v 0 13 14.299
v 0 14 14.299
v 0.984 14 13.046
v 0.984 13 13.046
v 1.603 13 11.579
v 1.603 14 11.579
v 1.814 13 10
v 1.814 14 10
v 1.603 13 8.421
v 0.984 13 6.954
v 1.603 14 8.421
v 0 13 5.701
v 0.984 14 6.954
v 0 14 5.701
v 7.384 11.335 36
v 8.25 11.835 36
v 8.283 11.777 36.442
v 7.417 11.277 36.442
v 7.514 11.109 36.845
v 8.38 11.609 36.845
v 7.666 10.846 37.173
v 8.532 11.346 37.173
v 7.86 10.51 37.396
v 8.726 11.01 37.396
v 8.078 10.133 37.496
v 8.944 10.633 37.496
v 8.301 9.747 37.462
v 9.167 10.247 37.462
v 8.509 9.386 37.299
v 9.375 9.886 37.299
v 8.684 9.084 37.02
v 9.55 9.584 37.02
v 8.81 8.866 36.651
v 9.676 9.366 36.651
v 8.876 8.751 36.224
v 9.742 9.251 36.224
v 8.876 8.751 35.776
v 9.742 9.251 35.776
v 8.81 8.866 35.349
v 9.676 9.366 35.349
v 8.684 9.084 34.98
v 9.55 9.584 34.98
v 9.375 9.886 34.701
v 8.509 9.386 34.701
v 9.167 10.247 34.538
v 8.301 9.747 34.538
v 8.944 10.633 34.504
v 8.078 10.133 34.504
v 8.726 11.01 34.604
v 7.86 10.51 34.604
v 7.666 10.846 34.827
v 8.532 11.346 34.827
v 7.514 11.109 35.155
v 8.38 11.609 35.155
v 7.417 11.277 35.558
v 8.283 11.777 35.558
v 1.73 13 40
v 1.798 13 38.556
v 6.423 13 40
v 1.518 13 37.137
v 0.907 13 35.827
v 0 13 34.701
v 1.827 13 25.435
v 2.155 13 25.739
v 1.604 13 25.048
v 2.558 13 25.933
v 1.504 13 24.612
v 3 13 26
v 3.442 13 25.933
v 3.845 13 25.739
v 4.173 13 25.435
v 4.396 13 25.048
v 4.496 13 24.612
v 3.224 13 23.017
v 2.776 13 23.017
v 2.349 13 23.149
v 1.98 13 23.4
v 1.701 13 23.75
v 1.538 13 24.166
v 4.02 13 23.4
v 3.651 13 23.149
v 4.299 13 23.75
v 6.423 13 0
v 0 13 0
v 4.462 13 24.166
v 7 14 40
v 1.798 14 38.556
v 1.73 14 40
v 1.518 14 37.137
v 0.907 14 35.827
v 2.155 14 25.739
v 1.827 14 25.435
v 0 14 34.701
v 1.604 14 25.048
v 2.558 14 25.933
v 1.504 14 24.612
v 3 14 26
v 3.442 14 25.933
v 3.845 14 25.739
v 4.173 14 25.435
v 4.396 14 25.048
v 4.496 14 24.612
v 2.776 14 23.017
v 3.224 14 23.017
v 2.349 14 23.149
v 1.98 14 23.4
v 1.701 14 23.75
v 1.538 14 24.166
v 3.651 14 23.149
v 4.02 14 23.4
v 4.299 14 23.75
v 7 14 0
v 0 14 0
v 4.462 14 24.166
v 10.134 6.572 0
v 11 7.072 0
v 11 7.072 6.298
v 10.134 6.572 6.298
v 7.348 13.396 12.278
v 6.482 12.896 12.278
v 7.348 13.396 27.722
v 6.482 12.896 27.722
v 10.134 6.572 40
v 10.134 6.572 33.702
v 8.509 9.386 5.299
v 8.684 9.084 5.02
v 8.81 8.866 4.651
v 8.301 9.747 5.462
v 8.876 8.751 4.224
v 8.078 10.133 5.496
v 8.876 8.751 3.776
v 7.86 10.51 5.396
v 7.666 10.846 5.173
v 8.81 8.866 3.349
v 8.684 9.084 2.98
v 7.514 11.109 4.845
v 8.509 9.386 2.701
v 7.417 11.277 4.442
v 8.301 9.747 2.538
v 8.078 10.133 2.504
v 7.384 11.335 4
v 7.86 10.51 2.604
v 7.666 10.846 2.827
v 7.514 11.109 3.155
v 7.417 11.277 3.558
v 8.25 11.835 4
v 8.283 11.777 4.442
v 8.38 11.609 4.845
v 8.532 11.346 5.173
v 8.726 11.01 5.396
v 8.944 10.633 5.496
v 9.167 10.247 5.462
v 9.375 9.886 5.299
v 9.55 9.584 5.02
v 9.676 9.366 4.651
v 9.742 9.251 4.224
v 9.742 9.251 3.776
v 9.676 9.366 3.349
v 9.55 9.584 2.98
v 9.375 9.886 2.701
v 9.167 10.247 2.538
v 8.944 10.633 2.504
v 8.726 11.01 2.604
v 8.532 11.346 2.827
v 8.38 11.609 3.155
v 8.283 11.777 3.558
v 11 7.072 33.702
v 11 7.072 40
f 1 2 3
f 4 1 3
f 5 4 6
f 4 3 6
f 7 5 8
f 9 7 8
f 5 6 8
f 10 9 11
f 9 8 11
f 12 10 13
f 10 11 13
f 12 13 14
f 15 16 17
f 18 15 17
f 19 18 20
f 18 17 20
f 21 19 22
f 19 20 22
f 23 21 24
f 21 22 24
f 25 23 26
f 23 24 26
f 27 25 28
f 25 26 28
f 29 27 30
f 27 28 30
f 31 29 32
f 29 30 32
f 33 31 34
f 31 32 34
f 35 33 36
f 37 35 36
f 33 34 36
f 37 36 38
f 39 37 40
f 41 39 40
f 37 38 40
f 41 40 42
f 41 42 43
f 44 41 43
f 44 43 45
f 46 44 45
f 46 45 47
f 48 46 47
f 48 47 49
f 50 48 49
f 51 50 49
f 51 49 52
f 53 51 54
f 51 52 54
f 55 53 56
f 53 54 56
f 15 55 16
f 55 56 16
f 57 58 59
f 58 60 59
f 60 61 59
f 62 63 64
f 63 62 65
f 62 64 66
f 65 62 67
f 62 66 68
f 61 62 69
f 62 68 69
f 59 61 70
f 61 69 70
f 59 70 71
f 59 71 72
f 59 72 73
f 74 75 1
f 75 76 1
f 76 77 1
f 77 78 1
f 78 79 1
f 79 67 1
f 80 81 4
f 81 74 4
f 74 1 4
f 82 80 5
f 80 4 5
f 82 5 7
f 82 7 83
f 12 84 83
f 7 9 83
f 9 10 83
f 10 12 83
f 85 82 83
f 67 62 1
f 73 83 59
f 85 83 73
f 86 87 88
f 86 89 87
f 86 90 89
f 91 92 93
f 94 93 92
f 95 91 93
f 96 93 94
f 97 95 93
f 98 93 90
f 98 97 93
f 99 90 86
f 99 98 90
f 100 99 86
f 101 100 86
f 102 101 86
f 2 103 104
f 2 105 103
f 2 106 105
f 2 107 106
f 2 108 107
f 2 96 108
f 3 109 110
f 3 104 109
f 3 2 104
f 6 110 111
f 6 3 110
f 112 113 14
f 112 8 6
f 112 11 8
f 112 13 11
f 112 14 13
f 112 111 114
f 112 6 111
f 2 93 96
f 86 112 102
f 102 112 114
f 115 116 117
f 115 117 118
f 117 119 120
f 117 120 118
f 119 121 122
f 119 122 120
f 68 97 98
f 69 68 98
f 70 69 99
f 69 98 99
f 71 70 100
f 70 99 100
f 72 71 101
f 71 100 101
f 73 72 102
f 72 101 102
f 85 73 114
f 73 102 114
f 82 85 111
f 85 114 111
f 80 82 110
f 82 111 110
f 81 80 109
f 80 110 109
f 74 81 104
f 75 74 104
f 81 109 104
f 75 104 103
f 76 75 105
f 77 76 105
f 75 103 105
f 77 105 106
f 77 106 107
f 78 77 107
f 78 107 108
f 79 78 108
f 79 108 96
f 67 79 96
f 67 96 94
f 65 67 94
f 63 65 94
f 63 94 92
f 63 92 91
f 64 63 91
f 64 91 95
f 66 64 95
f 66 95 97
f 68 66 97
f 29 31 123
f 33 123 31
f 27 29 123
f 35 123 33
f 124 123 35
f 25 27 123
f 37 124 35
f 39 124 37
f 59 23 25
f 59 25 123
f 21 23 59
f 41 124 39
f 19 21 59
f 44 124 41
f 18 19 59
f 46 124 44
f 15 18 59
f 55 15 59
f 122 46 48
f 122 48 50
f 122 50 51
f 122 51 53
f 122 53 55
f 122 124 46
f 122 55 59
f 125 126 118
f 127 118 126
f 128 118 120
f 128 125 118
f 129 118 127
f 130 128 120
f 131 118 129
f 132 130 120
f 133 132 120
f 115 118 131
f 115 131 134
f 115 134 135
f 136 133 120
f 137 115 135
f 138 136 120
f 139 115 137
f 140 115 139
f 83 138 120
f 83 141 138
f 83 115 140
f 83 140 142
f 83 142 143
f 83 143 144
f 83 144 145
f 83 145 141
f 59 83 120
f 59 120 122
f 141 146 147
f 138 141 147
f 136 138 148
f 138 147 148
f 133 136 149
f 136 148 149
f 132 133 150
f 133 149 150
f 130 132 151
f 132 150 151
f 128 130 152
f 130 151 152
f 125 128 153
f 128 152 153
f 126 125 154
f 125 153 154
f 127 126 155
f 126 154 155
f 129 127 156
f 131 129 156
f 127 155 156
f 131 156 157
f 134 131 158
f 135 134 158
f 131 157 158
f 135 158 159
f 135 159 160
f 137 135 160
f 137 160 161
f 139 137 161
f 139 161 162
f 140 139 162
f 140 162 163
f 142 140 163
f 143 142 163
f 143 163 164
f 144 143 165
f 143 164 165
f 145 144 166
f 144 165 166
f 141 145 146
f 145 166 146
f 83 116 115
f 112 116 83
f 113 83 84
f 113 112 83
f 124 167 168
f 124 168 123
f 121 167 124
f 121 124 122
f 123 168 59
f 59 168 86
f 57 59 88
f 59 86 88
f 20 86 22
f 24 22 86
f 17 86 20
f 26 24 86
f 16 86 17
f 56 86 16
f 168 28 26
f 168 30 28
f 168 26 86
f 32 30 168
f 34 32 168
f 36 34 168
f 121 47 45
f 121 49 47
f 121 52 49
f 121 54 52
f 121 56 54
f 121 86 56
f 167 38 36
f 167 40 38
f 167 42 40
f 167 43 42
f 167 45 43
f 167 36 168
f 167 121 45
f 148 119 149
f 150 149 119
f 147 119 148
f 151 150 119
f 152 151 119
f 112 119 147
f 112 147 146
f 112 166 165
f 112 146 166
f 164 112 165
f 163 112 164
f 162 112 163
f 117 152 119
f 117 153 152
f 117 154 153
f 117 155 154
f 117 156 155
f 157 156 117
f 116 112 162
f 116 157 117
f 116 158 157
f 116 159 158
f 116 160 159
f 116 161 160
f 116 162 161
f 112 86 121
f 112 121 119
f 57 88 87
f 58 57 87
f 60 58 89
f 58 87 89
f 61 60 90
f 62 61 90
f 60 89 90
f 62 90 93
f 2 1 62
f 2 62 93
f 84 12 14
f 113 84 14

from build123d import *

# Parameters (mm, degrees)
BOSS_EXTRUDE1_DEPTH = 40
SKETCH3_R           = 1.5
CUT_EXTRUDE2_DEPTH  = 1
SKETCH4_R           = 1.5
SKETCH4_R_2         = 6
CUT_EXTRUDE3_DEPTH  = 10


with BuildPart() as part:
    # Sketch1 → Boss-Extrude1 (new body)
    with BuildSketch(Plane.XY):
        Polygon((0, 13), (0, 14), (7, 14), (11, 7.07179677), (10.133974596, 6.57179677), (6.422649731, 13), (1, 13), align=None)
    extrude(amount=BOSS_EXTRUDE1_DEPTH)

    # Sketch3 → Cut-Extrude2 (cut)
    with BuildSketch(Plane(origin=(11.312177826, 6.531088913, 0), x_dir=(0, 0, -1), z_dir=(0.8660254037844402, 0.4999999999999976, 0))):
        with Locations(Location((-36, 4.624355653, 0), (0, 0, 90))):
            Circle(SKETCH3_R)
        with Locations(Location((-4, 4.624355653, 0), (0, 0, 90))):
            Circle(SKETCH3_R)
        Polygon((-33.701530723, 0.624355653), (-27.721710311, 7.927360795), (-12.278289689, 7.927360795), (-6.298469277, 0.624355653), align=None)
    extrude(amount=-CUT_EXTRUDE2_DEPTH, mode=Mode.SUBTRACT)

    # Sketch4 → Cut-Extrude3 (cut)
    with BuildSketch(Plane(origin=(0, 14, 0), x_dir=(-1, 0, 0), z_dir=(0, 1, 0))):
        with Locations(Location((-3, 24.5, 0), (0, 0, 90))):
            Circle(SKETCH4_R)
        with Locations((4.185654705, 10)):
            Circle(SKETCH4_R_2)
        with Locations((4.185654705, 39)):
            Circle(SKETCH4_R_2)
    extrude(amount=-CUT_EXTRUDE3_DEPTH, mode=Mode.SUBTRACT)


solid = part.part
